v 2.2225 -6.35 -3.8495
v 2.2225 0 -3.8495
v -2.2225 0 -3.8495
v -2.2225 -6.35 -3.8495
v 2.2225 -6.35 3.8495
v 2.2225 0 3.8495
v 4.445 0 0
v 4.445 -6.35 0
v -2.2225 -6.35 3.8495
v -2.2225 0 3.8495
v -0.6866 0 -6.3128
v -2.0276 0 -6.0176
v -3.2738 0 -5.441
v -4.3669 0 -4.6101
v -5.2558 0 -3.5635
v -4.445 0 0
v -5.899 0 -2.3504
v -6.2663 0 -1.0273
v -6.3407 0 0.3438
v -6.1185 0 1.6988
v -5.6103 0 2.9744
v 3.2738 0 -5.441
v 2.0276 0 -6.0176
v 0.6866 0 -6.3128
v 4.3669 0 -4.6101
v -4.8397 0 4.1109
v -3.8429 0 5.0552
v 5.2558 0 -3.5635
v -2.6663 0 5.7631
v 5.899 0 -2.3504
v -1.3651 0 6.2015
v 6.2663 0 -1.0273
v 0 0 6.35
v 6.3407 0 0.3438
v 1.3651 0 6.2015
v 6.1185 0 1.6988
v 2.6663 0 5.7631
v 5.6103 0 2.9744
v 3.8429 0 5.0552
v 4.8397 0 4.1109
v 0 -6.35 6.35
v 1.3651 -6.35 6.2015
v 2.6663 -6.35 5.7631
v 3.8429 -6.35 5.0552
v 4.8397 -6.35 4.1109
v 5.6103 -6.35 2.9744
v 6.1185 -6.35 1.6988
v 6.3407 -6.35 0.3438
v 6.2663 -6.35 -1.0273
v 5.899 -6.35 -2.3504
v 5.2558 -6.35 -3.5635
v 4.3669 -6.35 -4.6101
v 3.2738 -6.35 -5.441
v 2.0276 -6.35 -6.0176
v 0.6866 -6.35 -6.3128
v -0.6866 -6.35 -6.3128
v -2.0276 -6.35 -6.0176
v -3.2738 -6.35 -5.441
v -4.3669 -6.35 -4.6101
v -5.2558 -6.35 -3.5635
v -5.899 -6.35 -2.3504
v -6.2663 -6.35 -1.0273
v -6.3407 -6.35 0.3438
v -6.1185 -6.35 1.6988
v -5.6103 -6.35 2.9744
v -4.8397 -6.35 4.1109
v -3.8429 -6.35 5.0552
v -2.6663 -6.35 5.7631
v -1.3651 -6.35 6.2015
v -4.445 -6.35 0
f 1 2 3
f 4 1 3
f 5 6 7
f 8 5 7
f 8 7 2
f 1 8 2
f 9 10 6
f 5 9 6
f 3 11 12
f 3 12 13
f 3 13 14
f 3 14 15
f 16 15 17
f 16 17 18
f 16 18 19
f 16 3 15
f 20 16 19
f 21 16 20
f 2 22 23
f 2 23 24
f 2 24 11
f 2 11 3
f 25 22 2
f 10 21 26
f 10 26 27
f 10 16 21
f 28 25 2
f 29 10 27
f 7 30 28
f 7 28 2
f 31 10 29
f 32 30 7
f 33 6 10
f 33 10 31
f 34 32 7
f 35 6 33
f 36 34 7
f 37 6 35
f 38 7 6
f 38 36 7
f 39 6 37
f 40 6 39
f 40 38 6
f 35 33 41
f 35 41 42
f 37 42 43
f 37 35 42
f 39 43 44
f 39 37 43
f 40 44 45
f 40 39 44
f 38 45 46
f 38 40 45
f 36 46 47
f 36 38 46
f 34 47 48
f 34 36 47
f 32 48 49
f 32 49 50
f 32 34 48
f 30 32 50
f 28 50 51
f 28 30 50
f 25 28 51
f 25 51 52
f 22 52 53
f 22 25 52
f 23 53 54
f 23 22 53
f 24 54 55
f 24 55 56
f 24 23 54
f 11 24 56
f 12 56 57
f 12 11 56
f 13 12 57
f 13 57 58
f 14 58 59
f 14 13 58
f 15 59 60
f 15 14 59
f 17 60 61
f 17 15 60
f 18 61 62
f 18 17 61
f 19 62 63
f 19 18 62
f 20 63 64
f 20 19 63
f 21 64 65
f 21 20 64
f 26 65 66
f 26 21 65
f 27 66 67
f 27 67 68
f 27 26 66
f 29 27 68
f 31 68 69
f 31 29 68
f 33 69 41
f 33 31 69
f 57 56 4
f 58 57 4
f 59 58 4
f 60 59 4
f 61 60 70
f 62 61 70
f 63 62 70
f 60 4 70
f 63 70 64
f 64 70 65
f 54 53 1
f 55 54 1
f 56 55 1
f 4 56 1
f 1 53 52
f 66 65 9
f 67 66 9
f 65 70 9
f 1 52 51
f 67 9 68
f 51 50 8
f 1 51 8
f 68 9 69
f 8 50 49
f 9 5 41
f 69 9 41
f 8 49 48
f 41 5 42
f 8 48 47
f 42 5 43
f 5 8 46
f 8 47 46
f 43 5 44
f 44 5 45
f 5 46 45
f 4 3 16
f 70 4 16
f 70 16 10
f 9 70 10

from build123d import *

# Parameters (mm, degrees)
SKETCH1_R           = 6.35
BOSS_EXTRUDE1_DEPTH = 6.35
CUT_EXTRUDE1_DEPTH  = 11.998522628


with BuildPart() as part:
    # Sketch1 → Boss-Extrude1 (new body)
    with BuildSketch(Plane(origin=(0, 0, 0), x_dir=(1, 0, 0), z_dir=(0, 1, 0))):
        with Locations(Location((0, 0, 0), (0, 0, 270))):
            Circle(SKETCH1_R)
    extrude(amount=-BOSS_EXTRUDE1_DEPTH)

    # Sketch2 → Cut-Extrude1 (cut, through all)
    with BuildSketch(Plane(origin=(0, 0, 0), x_dir=(1, 0, 0), z_dir=(0, 1, 0))):
        Polygon((2.2225, 3.84948292), (-2.2225, 3.84948292), (-4.445, 0), (-2.2225, -3.84948292), (2.2225, -3.84948292), (4.445, 0), align=None)
    extrude(amount=-CUT_EXTRUDE1_DEPTH, mode=Mode.SUBTRACT)


solid = part.part
